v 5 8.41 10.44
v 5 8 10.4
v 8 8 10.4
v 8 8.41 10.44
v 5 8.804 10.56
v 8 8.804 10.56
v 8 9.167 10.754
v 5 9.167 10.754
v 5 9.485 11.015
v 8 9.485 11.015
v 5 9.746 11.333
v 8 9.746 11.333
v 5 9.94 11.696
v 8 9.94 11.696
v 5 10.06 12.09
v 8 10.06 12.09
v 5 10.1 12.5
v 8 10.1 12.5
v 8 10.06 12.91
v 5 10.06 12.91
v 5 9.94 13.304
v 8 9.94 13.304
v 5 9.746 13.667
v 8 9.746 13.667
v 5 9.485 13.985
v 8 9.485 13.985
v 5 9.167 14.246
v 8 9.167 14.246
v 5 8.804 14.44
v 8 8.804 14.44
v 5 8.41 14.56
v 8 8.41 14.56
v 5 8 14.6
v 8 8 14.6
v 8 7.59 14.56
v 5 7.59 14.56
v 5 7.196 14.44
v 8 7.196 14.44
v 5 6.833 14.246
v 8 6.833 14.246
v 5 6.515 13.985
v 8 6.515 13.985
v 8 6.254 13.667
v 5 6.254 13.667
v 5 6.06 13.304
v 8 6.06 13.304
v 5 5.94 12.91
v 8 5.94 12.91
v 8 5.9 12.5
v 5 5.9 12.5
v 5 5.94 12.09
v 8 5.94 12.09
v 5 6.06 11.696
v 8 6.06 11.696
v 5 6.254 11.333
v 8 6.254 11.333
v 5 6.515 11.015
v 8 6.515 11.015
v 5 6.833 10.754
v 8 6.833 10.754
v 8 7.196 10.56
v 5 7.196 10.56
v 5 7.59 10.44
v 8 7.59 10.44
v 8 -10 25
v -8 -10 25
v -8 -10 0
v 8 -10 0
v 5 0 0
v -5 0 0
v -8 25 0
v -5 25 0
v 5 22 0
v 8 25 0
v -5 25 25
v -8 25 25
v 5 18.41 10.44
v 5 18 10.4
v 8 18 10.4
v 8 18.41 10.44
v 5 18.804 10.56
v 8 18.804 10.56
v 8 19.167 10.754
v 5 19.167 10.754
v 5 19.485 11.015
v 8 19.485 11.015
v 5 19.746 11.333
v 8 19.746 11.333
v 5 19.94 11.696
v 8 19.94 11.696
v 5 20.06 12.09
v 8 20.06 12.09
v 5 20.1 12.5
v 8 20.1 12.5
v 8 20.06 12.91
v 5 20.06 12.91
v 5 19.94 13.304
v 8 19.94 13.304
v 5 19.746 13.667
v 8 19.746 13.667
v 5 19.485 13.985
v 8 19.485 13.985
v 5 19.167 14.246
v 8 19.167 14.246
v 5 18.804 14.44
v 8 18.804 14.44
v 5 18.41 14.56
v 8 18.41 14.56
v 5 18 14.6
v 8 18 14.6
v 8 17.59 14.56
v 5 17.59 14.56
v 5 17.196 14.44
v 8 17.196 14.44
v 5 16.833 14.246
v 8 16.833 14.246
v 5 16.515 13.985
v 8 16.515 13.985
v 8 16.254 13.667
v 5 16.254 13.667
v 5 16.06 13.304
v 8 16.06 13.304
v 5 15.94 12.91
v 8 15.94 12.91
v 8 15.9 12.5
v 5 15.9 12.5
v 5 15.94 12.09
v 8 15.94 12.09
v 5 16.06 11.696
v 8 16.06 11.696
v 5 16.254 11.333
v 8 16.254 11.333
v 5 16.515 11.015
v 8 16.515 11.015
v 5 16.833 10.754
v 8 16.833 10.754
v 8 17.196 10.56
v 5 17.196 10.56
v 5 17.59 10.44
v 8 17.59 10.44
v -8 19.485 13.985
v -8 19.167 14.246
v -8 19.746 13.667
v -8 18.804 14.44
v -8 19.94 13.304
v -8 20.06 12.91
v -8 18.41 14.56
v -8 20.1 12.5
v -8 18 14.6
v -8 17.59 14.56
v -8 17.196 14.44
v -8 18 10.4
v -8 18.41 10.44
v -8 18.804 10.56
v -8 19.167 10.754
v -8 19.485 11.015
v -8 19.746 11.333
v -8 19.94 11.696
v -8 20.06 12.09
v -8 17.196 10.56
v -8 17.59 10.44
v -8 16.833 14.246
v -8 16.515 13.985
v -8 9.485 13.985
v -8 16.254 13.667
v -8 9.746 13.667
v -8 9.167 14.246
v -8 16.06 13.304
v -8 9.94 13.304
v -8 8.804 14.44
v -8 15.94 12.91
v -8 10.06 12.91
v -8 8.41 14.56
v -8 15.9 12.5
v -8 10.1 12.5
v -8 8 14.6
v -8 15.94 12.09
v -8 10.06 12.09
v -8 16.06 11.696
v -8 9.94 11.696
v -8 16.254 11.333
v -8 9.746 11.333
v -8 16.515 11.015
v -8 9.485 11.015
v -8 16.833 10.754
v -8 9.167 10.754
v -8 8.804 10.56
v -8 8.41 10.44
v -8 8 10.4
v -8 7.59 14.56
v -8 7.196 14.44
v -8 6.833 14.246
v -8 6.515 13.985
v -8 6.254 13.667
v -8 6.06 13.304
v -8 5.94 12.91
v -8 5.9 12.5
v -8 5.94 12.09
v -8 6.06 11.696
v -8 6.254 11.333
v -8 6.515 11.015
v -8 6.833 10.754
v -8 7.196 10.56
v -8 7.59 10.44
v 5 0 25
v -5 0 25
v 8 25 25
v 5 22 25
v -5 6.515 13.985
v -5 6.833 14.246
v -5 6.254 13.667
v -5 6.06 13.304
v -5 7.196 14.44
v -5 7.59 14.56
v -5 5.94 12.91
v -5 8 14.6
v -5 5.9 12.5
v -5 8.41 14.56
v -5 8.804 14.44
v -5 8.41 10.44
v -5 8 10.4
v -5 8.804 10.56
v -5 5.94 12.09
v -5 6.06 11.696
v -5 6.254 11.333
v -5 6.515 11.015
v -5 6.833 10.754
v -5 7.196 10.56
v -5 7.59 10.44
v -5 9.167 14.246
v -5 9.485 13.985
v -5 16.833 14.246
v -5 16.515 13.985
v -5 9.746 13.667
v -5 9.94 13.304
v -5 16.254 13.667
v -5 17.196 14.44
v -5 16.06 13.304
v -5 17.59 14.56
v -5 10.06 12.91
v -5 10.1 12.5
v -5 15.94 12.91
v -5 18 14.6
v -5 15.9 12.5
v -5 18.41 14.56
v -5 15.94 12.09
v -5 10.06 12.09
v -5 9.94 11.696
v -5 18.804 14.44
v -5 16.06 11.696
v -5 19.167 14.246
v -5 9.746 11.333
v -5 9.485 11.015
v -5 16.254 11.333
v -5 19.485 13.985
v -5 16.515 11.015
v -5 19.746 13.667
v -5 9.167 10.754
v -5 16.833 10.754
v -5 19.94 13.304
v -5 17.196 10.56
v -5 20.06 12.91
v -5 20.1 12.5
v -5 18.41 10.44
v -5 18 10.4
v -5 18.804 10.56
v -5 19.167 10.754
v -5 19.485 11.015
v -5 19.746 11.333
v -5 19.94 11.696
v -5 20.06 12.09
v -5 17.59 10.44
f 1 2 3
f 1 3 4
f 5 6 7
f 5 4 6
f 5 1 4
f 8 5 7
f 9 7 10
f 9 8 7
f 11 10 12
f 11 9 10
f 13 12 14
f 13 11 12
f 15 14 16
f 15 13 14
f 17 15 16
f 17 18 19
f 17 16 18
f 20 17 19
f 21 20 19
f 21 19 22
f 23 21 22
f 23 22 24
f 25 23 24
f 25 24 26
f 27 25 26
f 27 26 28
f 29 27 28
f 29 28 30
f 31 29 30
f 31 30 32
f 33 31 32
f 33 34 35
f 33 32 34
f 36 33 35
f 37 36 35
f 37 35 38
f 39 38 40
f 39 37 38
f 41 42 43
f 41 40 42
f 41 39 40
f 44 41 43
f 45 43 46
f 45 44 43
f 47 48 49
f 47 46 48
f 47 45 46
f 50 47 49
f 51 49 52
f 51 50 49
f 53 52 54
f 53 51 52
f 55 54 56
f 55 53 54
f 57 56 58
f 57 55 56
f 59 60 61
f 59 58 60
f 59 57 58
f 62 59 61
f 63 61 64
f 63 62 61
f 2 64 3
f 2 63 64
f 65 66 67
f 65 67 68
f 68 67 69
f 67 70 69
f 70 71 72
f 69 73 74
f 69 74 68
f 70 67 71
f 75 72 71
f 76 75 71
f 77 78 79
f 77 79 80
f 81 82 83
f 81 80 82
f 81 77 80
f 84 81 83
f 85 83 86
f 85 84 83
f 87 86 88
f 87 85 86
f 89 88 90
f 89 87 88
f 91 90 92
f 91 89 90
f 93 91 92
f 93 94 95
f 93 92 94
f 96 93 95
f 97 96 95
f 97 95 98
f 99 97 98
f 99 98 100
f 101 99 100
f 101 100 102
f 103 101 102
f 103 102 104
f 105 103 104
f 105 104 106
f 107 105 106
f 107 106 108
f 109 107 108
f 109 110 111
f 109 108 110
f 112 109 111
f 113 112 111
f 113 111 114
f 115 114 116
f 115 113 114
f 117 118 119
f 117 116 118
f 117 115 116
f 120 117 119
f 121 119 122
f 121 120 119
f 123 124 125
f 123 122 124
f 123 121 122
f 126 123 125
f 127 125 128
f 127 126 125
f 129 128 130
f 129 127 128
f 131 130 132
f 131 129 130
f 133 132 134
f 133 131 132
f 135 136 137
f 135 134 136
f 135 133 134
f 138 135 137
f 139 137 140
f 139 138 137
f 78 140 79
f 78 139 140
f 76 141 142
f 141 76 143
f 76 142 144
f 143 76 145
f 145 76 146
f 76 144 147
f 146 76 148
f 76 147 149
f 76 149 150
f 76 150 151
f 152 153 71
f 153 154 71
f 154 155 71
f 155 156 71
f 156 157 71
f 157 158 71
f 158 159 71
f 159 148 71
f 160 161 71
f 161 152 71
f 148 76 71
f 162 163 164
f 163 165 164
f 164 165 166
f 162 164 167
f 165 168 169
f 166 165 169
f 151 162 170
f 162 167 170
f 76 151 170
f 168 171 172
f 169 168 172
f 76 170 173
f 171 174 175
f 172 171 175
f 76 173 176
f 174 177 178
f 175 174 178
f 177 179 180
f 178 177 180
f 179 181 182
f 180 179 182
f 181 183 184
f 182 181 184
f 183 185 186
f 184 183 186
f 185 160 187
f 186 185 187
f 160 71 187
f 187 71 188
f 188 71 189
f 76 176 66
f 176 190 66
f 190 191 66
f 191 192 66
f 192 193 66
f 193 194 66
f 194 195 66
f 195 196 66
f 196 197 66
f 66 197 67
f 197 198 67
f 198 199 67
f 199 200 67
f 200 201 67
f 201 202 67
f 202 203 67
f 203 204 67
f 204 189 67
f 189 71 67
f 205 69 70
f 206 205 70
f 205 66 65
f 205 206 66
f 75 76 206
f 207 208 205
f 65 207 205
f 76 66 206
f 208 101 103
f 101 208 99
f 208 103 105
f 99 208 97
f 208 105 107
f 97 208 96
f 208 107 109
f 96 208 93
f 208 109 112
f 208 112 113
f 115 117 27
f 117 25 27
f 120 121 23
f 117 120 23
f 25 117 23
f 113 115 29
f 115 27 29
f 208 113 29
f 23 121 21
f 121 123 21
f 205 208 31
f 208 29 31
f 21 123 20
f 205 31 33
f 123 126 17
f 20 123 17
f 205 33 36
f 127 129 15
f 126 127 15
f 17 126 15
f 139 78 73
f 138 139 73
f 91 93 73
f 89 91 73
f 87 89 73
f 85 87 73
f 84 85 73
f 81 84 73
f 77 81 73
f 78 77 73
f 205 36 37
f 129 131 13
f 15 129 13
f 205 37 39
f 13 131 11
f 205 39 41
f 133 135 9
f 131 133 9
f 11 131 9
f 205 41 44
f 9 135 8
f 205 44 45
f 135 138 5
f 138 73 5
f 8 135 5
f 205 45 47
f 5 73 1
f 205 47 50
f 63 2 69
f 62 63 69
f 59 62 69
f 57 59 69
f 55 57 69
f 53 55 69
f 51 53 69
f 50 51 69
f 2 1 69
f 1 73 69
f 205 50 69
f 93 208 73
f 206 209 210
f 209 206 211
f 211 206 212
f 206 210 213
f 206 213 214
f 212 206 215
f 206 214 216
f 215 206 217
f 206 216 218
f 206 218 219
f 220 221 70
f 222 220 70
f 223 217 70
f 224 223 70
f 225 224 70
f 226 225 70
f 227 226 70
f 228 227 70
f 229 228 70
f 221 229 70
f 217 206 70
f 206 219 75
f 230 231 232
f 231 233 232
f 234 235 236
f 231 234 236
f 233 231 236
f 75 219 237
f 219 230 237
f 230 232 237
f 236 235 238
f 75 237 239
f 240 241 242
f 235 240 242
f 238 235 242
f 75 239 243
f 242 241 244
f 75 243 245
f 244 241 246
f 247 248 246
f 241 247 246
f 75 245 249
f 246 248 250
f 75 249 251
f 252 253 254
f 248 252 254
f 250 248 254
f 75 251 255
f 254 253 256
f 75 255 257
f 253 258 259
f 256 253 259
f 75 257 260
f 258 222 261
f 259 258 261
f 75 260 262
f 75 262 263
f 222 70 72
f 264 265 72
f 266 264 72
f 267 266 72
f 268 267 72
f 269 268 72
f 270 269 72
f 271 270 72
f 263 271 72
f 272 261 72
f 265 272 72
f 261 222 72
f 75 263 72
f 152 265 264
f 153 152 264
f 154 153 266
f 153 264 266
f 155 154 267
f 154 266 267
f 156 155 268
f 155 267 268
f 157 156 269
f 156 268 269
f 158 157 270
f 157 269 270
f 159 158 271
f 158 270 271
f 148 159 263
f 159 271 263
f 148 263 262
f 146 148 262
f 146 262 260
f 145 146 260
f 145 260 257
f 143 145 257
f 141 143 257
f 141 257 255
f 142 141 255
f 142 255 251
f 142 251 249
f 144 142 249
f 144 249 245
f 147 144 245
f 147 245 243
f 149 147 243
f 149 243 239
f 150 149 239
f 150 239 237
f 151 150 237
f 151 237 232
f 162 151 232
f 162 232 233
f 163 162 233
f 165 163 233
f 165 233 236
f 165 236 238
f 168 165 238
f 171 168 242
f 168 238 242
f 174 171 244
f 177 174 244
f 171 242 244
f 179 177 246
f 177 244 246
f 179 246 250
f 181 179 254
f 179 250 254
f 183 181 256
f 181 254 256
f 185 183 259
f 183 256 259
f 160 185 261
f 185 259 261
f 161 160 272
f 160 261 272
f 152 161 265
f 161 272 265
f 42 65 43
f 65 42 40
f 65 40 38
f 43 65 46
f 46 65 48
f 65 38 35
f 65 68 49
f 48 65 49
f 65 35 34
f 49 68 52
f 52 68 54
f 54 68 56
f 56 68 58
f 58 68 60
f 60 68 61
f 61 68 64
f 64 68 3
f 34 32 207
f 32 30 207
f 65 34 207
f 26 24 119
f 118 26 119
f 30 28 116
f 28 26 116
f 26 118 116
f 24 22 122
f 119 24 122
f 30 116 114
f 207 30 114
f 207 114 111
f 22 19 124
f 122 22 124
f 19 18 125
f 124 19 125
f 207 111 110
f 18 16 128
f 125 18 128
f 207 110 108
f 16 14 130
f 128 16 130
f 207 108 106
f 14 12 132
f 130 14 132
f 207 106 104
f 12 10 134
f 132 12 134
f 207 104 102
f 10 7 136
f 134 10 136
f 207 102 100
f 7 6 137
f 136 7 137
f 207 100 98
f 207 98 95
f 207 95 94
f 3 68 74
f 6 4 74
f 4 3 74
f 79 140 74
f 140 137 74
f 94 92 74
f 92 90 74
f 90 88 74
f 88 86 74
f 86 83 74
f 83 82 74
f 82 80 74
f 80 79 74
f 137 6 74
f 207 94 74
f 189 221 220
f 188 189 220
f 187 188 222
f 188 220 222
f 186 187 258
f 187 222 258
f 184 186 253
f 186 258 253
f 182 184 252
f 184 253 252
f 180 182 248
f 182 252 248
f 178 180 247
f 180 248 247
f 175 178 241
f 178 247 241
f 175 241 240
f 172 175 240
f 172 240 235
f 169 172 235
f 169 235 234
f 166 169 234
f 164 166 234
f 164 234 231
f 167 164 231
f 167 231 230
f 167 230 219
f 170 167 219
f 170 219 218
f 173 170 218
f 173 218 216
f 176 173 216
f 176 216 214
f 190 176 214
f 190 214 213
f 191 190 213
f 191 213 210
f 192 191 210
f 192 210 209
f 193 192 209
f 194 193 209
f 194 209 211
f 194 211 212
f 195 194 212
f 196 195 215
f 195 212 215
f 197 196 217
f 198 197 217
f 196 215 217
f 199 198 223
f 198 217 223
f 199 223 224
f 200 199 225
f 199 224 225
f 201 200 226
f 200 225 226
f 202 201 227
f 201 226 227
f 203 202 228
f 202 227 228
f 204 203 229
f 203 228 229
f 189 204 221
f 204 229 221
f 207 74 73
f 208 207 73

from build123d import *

# Parameters (mm, degrees)
EXTRUDE_1_DEPTH          = 25
SKETCH_2_R               = 2.1
CUT_EXTRUDE_1_DEPTH      = 37.249137921
CUT_EXTRUDE_2_DEPTH      = 37.249137921
CUT_EXTRUDE_2_DEPTH_BACK = 37.249137921
SKETCH_2_2_R             = 2.1


with BuildPart() as part:
    # 草图1 → 凸台-拉伸1 (new body)
    with BuildSketch(Plane.XY):
        Polygon((-8, -10), (8, -10), (8, 25), (5, 22), (5, 0), (-5, 0), (-5, 25), (-8, 25), align=None)
    extrude(amount=EXTRUDE_1_DEPTH)

    # 草图2 → 切除-拉伸1 (cut, through all)
    with BuildSketch(Plane(origin=(0, 0, 0), x_dir=(0, 0, -1), z_dir=(1, 0, 0))):
        with Locations((-12.5, 8)):
            Circle(SKETCH_2_R)
        with Locations((-12.5, 18)):
            Circle(SKETCH_2_R)
    extrude(amount=-CUT_EXTRUDE_1_DEPTH, mode=Mode.SUBTRACT)

    # 草图2<2> → 切除-拉伸2 (cut, two sides: drawn at the far end of the back side and taken through both)
    with BuildSketch(Plane(origin=(0, 0, 0), x_dir=(0, 0, -1), z_dir=(1, 0, 0)).offset(-CUT_EXTRUDE_2_DEPTH_BACK)):
        with Locations((-12.5, 8)):
            Circle(SKETCH_2_2_R)
        with Locations((-12.5, 18)):
            Circle(SKETCH_2_2_R)
    extrude(amount=CUT_EXTRUDE_2_DEPTH + CUT_EXTRUDE_2_DEPTH_BACK, mode=Mode.SUBTRACT)


solid = part.part
